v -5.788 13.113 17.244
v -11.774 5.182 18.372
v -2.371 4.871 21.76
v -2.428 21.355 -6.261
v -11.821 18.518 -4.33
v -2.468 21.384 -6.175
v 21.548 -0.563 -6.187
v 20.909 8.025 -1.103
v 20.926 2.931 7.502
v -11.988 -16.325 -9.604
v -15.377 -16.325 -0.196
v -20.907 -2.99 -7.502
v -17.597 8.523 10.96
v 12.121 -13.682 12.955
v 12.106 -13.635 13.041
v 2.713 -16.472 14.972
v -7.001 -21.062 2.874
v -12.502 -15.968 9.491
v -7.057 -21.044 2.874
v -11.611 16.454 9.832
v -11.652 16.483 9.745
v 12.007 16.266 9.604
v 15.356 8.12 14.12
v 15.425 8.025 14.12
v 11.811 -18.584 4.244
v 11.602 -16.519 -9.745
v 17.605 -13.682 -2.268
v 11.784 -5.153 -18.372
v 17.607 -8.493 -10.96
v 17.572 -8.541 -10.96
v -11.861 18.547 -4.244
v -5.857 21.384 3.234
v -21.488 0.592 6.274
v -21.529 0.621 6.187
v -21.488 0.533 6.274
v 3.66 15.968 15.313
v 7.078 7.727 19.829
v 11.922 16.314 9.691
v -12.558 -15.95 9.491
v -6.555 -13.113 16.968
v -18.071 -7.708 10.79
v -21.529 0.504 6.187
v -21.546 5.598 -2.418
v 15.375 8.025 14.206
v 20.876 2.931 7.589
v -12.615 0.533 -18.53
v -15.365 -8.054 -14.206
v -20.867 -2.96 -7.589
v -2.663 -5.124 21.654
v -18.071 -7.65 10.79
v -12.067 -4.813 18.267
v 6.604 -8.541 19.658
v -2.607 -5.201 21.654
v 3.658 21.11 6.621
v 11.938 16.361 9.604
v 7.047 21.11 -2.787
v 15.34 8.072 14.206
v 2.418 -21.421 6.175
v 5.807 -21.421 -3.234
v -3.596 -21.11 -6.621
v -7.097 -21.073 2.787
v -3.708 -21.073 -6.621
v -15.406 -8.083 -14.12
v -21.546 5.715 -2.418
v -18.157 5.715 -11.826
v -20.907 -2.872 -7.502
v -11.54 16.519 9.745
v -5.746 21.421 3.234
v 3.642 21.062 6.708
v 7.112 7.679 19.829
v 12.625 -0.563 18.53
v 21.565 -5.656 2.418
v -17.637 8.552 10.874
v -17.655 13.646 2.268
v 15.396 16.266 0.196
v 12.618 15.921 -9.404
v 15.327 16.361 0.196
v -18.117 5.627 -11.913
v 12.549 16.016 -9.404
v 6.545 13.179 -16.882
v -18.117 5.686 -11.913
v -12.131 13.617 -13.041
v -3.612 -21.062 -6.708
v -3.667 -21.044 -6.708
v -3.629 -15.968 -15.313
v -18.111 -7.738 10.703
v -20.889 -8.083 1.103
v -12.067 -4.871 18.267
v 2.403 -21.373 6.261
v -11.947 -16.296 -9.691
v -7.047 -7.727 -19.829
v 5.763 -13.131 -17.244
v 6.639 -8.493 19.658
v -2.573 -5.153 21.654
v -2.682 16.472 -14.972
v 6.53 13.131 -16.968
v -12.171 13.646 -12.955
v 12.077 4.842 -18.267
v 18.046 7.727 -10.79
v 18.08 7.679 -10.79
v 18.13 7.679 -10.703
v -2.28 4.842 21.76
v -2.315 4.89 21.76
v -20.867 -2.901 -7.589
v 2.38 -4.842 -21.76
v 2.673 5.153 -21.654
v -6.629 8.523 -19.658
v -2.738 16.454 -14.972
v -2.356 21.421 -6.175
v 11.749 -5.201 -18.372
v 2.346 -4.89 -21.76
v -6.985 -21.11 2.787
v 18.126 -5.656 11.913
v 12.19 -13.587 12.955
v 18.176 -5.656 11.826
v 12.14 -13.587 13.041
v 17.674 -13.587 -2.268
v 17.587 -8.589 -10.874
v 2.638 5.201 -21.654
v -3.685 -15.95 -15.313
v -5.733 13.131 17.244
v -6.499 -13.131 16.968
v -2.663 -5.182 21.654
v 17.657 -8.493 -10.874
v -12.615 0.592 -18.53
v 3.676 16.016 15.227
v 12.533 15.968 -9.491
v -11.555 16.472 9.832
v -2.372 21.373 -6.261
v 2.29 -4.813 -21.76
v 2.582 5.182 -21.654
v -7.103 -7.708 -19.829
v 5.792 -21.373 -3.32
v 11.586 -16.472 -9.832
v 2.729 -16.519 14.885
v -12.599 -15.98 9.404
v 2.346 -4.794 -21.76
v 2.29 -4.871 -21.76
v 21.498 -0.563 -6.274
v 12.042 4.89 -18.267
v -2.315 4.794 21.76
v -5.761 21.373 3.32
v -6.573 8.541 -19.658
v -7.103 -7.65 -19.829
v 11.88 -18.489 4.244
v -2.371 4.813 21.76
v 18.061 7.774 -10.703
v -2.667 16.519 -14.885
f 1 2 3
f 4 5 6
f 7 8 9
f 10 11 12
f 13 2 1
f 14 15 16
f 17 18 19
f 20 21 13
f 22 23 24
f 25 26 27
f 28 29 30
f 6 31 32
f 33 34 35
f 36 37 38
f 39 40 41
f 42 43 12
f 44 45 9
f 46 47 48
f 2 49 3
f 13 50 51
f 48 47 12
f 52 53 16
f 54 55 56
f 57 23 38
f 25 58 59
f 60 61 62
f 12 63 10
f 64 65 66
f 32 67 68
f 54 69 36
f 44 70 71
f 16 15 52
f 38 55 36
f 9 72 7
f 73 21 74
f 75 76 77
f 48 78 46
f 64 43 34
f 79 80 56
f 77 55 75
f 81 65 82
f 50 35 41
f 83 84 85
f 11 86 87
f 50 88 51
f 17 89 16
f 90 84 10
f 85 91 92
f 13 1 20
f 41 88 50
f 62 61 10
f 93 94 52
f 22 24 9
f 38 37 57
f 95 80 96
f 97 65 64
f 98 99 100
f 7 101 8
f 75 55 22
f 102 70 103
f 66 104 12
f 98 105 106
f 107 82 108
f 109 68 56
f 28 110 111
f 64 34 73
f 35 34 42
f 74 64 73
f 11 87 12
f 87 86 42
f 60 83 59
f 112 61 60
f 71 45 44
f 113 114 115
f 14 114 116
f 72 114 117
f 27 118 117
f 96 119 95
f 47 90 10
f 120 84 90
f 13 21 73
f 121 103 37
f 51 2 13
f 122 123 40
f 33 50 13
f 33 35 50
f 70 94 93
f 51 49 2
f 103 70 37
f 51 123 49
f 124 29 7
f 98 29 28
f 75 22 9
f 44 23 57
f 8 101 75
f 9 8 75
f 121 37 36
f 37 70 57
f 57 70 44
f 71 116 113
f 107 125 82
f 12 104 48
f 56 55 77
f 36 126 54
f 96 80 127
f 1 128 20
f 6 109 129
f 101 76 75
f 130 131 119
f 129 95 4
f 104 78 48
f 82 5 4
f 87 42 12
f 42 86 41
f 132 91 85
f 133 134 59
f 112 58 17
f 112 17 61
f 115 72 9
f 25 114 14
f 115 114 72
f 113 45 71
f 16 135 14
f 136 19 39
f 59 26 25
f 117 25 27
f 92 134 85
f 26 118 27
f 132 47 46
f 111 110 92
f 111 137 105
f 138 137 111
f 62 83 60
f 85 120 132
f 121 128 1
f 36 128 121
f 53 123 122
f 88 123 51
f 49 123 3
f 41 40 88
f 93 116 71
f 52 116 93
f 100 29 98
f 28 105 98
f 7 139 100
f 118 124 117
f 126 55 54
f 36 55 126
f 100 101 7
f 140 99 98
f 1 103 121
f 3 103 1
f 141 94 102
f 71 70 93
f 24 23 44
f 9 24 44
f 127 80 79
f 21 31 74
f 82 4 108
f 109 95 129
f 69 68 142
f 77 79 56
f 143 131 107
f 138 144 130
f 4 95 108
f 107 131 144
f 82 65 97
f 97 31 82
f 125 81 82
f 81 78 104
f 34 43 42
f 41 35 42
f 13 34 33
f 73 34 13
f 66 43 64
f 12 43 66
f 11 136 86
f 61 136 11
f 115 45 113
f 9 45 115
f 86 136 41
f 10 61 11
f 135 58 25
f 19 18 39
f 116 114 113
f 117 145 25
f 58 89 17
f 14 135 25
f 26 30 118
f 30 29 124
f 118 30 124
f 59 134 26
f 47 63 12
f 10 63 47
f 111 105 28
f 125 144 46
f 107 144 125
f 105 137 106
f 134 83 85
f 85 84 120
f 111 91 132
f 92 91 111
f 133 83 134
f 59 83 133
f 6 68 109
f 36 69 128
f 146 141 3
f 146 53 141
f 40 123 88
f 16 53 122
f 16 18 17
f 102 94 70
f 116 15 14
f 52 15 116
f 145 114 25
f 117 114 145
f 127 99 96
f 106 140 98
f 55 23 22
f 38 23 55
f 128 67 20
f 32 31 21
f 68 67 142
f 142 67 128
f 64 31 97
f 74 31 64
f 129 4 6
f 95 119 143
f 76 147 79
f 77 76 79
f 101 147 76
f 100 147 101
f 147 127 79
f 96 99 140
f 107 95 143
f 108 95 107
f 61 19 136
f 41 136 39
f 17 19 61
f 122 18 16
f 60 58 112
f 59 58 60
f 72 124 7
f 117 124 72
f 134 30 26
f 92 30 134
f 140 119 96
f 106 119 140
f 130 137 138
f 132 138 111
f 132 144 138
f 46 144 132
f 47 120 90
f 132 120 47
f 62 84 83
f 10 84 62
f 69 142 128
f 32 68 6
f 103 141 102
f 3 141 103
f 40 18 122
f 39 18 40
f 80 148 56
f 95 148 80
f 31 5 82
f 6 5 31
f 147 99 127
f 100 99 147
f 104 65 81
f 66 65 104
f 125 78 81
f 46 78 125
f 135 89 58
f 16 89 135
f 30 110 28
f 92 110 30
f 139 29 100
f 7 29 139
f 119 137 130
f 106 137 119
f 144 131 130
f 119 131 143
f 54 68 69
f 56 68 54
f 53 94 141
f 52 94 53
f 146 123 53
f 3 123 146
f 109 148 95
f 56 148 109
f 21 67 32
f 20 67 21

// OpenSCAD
// Auto-generated OpenSCAD file

    inner_points = 10*[[0.3627043479586896, 2.1014561533744316, 0.6621144681370361], [0.23873649941994707, -2.132561977195345, 0.6174562938096761], [-0.5776558269711908, 2.1325619771953757, 0.3233591447393587], [-0.7016236755099334, -2.1014561533744005, 0.2787009704119987], [0.7016236755099334, 2.1014561533744005, -0.2787009704119987], [0.5776558269711908, -2.1325619771953757, -0.3233591447393587], [-0.23873649941994707, 2.132561977195345, -0.6174562938096761], [-0.3627043479586896, -2.1014561533744316, -0.6621144681370361], [-0.23303014809308217, 0.484205136480117, 2.167327920132479], [-0.2622949873726234, -0.5153109603009306, 2.1567855552401864], [-1.1733903230229628, 0.5153109603010614, 1.8285725967348017], [-1.202655162302504, -0.48420513647998625, 1.8180302318425088], [1.202655162302504, 0.48420513647998625, -1.8180302318425088], [1.1733903230229628, -0.5153109603010614, -1.8285725967348017], [0.2622949873726234, 0.5153109603009306, -2.1567855552401864], [0.23303014809308217, -0.484205136480117, -2.167327920132479], [1.1907004237534802, 1.6266370713489897, 0.960391751571334], [1.8076227287528912, -0.5656412404913346, 1.1826318256546142], [-2.146542056304135, 0.5656412404913654, -0.2418163871055795], [-1.5296197513047238, -1.6266370713489589, -0.019576313022299174], [1.5296197513047238, 1.6266370713489589, 0.019576313022299174], [2.146542056304135, -0.5656412404913654, 0.2418163871055795], [-1.8076227287528912, 0.5656412404913346, -1.1826318256546142], [-1.1907004237534802, -1.6266370713489897, -0.960391751571334], [2.0826192779262027, 0.29308837441609126, 0.7502427110556056], [1.1780068582222707, -1.848859657233879, 0.4243651580114814], [-1.1780068582222707, 1.848859657233879, -0.4243651580114814], [-2.0826192779262027, -0.29308837441609126, -0.7502427110556056], [-0.5748026513077584, 1.308383556837762, 1.7157512517104363], [-0.6514189952169003, -1.3083835568376503, 1.6881509821006098], [0.6514189952169003, 1.3083835568376503, -1.6881509821006098], [0.5748026513077584, -1.308383556837762, -1.7157512517104363], [1.2574763777948448, -0.05627096391608096, 1.8443575345923855], [-2.1447786967682596, 0.056270963916161786, 0.618729260669626], [2.1447786967682596, -0.056270963916161786, -0.618729260669626], [-1.2574763777948448, 0.05627096391608096, -1.8443575345923855], [0.36446770749456503, 1.5920858767992276, 1.5226601159122415], [0.2697646982353637, -1.6424161569895013, 1.4885443064771746], [-1.1570670172087785, 1.642416156989582, 0.9745424887848368], [-1.2517700264679799, -1.592085876799147, 0.94042667934977], [1.2517700264679799, 1.592085876799147, -0.94042667934977], [1.1570670172087785, -1.642416156989582, -0.9745424887848368], [-0.2697646982353637, 1.6424161569895013, -1.4885443064771746], [-0.36446770749456503, -1.5920858767992276, -1.5226601159122415], [0.7062402107092415, 0.767907456441583, 1.9742367843342843], [0.6588887060796405, -0.8493435604527816, 1.9571788796167506], [-1.7556546889239826, 0.8493435604528814, 1.0873638338092022], [-1.8030061935535835, -0.7679074564414831, 1.0703059290916686], [1.8030061935535835, 0.7679074564414831, -1.0703059290916686], [1.7556546889239826, -0.8493435604528814, -1.0873638338092022], [-0.6588887060796405, 0.8493435604527816, -1.9571788796167506], [-0.7062402107092415, -0.767907456441583, -1.9742367843342843], [1.5324729269681563, 0.8024586509913448, 1.4119684199933769], [1.209035057037687, -1.3587138370280352, 1.2954531706789796], [-1.7574180484598583, 1.3587138370280851, 0.22681818603399673], [-2.0808559183903275, -0.8024586509912949, 0.11030293671959968], [2.0808559183903275, 0.8024586509912949, -0.11030293671959968], [1.7574180484598583, -1.3587138370280851, -0.22681818603399673], [-1.209035057037687, 1.3587138370280352, -1.2954531706789796], [-1.5324729269681563, -0.8024586509913448, -1.4119684199933769]];

    outer_points = 10*[[-0.7016236755099551, -2.10145615337441, 0.2787009704118737], [-0.5776558269712173, 2.1325619771953654, 0.3233591447393821], [0.23873649941989808, -2.1325619771953654, 0.6174562938096255], [0.36270434795863593, 2.10145615337441, 0.6621144681371339], [-0.36270434795863593, -2.10145615337441, -0.6621144681371339], [-0.23873649941989808, 2.1325619771953654, -0.6174562938096255], [0.5776558269712173, -2.1325619771953654, -0.3233591447393821], [0.7016236755099551, 2.10145615337441, -0.2787009704118737], [-1.2026551623026496, -0.48420513648004604, 1.8180302318423964], [-1.1733903230231093, 0.5153109603010012, 1.8285725967347242], [-0.26229498737279616, -0.5153109603010012, 2.1567855552401483], [-0.23303014809325606, 0.48420513648004604, 2.167327920132476], [0.23303014809325606, -0.48420513648004604, -2.167327920132476], [0.26229498737279616, 0.5153109603010012, -2.1567855552401483], [1.1733903230231093, -0.5153109603010012, -1.8285725967347242], [1.2026551623026496, 0.48420513648004604, -1.8180302318423964], [-1.5296197513047218, -1.6266370713489584, -0.019576313022475034], [-2.1465420563041158, 0.5656412404913728, -0.2418163871057331], [1.8076227287527964, -0.5656412404913728, 1.1826318256547408], [1.1907004237534027, 1.6266370713489584, 0.9603917515714826], [-1.1907004237534027, -1.6266370713489584, -0.9603917515714826], [-1.8076227287527964, 0.5656412404913728, -1.1826318256547408], [2.1465420563041158, -0.5656412404913728, 0.2418163871057331], [1.5296197513047218, 1.6266370713489584, 0.019576313022475034], [-2.0826192779261423, -0.2930883744160672, -0.7502427110557822], [-1.178006858222237, 1.8488596572338925, -0.42436515801151536], [1.178006858222237, -1.8488596572338925, 0.42436515801151536], [2.0826192779261423, 0.2930883744160672, 0.7502427110557822], [-0.6514189952170353, -1.3083835568377056, 1.6881509821005147], [-0.5748026513078963, 1.3083835568377056, 1.7157512517104327], [0.5748026513078963, -1.3083835568377056, -1.7157512517104327], [0.6514189952170353, 1.3083835568377056, -1.6881509821005147], [-2.144778696768309, 0.05627096391614097, 0.6187292606694557], [1.2574763777946967, -0.05627096391614097, 1.8443575345924843], [-1.2574763777946967, 0.05627096391614097, -1.8443575345924843], [2.144778696768309, -0.05627096391614097, -0.6187292606694557], [-1.2517700264680547, -1.5920858767991781, 0.9404266793496172], [-1.157067017208857, 1.6424161569895497, 0.9745424887847978], [0.2697646982352448, -1.6424161569895497, 1.4885443064771422], [0.3644677074944424, 1.5920858767991781, 1.5226601159123228], [-0.3644677074944424, -1.5920858767991781, -1.5226601159123228], [-0.2697646982352448, 1.6424161569895497, -1.4885443064771422], [1.157067017208857, -1.6424161569895497, -0.9745424887847978], [1.2517700264680547, 1.5920858767991781, -0.9404266793496172], [-1.803006193553669, -0.7679074564415186, 1.070305929091499], [-1.75565468892407, 0.8493435604528453, 1.0873638338090892], [0.6588887060794838, -0.8493435604528453, 1.9571788796167757], [0.7062402107090827, 0.7679074564415186, 1.974236784334366], [-0.7062402107090827, -0.7679074564415186, -1.974236784334366], [-0.6588887060794838, 0.8493435604528453, -1.9571788796167757], [1.75565468892407, -0.8493435604528453, -1.0873638338090892], [1.803006193553669, 0.7679074564415186, -1.070305929091499], [-2.0808559183903363, -0.802458650991299, 0.11030293671940661], [-1.7574180484598767, 1.3587138370280771, 0.22681818603390036], [1.2090350570375834, -1.3587138370280771, 1.295453170679032], [1.532472926968043, 0.802458650991299, 1.4119684199935258], [-1.532472926968043, -0.802458650991299, -1.4119684199935258], [-1.2090350570375834, 1.3587138370280771, -1.295453170679032], [1.7574180484598767, -1.3587138370280771, -0.22681818603390036], [2.0808559183903363, 0.802458650991299, -0.11030293671940661]];

    // Convex hull for inner set (I)
    module inner_hull() {
        hull() {
            for (p = inner_points) {
                translate(p) sphere(r=0.1);
            }
        }
    }

    // Convex hull for outer set (O) minus inner hull (O \ I)
    module outer_minus_inner() {
        difference() {
            hull() {
                for (p = outer_points) {
                    translate(p) sphere(r=0.1);
                }
            }
            inner_hull(); // Subtract inner hull
        }
    }

    // Convex hull for outer set (O) minus all translated inner hulls
    module outer_minus_AllTranslationInner() {
        difference() {
            hull() {
                for (p = outer_points) {
                    translate(p) sphere(r=0.1);
                }
            }
            hull() {
                translate([0,0,50]) inner_hull();
                translate([0,0,-50]) inner_hull();
            }; // Subtract translated inner hulls
        }
    }

    // Difference between outer_minus_inner and outer_minus_AllTranslationInner
    module outer_minus_inner_diff() {
        difference() {
            // Outer minus inner
            difference() {
                hull() {
                    for (p = outer_points) {
                        translate(p) sphere(r=0.1);
                    }
                }
                inner_hull();
            }

            // Subtract Outer minus AllTranslationInner
            difference() {
                hull() {
                    for (p = outer_points) {
                        translate(p) sphere(r=0.1);
                    }
                }
                hull() {
                    translate([0,0,50]) inner_hull();
                    translate([0,0,-50]) inner_hull();
                };
            }
        }
    }

    // Rendering all with colors applied
    color([1, 0, 0, 0.5]) inner_hull(); // Transparent red
    color([0, 1, 0, 1]) outer_minus_AllTranslationInner(); // Opaque green
    color([1, 1, 0, 1]) outer_minus_inner_diff(); // Opaque yellow
    
